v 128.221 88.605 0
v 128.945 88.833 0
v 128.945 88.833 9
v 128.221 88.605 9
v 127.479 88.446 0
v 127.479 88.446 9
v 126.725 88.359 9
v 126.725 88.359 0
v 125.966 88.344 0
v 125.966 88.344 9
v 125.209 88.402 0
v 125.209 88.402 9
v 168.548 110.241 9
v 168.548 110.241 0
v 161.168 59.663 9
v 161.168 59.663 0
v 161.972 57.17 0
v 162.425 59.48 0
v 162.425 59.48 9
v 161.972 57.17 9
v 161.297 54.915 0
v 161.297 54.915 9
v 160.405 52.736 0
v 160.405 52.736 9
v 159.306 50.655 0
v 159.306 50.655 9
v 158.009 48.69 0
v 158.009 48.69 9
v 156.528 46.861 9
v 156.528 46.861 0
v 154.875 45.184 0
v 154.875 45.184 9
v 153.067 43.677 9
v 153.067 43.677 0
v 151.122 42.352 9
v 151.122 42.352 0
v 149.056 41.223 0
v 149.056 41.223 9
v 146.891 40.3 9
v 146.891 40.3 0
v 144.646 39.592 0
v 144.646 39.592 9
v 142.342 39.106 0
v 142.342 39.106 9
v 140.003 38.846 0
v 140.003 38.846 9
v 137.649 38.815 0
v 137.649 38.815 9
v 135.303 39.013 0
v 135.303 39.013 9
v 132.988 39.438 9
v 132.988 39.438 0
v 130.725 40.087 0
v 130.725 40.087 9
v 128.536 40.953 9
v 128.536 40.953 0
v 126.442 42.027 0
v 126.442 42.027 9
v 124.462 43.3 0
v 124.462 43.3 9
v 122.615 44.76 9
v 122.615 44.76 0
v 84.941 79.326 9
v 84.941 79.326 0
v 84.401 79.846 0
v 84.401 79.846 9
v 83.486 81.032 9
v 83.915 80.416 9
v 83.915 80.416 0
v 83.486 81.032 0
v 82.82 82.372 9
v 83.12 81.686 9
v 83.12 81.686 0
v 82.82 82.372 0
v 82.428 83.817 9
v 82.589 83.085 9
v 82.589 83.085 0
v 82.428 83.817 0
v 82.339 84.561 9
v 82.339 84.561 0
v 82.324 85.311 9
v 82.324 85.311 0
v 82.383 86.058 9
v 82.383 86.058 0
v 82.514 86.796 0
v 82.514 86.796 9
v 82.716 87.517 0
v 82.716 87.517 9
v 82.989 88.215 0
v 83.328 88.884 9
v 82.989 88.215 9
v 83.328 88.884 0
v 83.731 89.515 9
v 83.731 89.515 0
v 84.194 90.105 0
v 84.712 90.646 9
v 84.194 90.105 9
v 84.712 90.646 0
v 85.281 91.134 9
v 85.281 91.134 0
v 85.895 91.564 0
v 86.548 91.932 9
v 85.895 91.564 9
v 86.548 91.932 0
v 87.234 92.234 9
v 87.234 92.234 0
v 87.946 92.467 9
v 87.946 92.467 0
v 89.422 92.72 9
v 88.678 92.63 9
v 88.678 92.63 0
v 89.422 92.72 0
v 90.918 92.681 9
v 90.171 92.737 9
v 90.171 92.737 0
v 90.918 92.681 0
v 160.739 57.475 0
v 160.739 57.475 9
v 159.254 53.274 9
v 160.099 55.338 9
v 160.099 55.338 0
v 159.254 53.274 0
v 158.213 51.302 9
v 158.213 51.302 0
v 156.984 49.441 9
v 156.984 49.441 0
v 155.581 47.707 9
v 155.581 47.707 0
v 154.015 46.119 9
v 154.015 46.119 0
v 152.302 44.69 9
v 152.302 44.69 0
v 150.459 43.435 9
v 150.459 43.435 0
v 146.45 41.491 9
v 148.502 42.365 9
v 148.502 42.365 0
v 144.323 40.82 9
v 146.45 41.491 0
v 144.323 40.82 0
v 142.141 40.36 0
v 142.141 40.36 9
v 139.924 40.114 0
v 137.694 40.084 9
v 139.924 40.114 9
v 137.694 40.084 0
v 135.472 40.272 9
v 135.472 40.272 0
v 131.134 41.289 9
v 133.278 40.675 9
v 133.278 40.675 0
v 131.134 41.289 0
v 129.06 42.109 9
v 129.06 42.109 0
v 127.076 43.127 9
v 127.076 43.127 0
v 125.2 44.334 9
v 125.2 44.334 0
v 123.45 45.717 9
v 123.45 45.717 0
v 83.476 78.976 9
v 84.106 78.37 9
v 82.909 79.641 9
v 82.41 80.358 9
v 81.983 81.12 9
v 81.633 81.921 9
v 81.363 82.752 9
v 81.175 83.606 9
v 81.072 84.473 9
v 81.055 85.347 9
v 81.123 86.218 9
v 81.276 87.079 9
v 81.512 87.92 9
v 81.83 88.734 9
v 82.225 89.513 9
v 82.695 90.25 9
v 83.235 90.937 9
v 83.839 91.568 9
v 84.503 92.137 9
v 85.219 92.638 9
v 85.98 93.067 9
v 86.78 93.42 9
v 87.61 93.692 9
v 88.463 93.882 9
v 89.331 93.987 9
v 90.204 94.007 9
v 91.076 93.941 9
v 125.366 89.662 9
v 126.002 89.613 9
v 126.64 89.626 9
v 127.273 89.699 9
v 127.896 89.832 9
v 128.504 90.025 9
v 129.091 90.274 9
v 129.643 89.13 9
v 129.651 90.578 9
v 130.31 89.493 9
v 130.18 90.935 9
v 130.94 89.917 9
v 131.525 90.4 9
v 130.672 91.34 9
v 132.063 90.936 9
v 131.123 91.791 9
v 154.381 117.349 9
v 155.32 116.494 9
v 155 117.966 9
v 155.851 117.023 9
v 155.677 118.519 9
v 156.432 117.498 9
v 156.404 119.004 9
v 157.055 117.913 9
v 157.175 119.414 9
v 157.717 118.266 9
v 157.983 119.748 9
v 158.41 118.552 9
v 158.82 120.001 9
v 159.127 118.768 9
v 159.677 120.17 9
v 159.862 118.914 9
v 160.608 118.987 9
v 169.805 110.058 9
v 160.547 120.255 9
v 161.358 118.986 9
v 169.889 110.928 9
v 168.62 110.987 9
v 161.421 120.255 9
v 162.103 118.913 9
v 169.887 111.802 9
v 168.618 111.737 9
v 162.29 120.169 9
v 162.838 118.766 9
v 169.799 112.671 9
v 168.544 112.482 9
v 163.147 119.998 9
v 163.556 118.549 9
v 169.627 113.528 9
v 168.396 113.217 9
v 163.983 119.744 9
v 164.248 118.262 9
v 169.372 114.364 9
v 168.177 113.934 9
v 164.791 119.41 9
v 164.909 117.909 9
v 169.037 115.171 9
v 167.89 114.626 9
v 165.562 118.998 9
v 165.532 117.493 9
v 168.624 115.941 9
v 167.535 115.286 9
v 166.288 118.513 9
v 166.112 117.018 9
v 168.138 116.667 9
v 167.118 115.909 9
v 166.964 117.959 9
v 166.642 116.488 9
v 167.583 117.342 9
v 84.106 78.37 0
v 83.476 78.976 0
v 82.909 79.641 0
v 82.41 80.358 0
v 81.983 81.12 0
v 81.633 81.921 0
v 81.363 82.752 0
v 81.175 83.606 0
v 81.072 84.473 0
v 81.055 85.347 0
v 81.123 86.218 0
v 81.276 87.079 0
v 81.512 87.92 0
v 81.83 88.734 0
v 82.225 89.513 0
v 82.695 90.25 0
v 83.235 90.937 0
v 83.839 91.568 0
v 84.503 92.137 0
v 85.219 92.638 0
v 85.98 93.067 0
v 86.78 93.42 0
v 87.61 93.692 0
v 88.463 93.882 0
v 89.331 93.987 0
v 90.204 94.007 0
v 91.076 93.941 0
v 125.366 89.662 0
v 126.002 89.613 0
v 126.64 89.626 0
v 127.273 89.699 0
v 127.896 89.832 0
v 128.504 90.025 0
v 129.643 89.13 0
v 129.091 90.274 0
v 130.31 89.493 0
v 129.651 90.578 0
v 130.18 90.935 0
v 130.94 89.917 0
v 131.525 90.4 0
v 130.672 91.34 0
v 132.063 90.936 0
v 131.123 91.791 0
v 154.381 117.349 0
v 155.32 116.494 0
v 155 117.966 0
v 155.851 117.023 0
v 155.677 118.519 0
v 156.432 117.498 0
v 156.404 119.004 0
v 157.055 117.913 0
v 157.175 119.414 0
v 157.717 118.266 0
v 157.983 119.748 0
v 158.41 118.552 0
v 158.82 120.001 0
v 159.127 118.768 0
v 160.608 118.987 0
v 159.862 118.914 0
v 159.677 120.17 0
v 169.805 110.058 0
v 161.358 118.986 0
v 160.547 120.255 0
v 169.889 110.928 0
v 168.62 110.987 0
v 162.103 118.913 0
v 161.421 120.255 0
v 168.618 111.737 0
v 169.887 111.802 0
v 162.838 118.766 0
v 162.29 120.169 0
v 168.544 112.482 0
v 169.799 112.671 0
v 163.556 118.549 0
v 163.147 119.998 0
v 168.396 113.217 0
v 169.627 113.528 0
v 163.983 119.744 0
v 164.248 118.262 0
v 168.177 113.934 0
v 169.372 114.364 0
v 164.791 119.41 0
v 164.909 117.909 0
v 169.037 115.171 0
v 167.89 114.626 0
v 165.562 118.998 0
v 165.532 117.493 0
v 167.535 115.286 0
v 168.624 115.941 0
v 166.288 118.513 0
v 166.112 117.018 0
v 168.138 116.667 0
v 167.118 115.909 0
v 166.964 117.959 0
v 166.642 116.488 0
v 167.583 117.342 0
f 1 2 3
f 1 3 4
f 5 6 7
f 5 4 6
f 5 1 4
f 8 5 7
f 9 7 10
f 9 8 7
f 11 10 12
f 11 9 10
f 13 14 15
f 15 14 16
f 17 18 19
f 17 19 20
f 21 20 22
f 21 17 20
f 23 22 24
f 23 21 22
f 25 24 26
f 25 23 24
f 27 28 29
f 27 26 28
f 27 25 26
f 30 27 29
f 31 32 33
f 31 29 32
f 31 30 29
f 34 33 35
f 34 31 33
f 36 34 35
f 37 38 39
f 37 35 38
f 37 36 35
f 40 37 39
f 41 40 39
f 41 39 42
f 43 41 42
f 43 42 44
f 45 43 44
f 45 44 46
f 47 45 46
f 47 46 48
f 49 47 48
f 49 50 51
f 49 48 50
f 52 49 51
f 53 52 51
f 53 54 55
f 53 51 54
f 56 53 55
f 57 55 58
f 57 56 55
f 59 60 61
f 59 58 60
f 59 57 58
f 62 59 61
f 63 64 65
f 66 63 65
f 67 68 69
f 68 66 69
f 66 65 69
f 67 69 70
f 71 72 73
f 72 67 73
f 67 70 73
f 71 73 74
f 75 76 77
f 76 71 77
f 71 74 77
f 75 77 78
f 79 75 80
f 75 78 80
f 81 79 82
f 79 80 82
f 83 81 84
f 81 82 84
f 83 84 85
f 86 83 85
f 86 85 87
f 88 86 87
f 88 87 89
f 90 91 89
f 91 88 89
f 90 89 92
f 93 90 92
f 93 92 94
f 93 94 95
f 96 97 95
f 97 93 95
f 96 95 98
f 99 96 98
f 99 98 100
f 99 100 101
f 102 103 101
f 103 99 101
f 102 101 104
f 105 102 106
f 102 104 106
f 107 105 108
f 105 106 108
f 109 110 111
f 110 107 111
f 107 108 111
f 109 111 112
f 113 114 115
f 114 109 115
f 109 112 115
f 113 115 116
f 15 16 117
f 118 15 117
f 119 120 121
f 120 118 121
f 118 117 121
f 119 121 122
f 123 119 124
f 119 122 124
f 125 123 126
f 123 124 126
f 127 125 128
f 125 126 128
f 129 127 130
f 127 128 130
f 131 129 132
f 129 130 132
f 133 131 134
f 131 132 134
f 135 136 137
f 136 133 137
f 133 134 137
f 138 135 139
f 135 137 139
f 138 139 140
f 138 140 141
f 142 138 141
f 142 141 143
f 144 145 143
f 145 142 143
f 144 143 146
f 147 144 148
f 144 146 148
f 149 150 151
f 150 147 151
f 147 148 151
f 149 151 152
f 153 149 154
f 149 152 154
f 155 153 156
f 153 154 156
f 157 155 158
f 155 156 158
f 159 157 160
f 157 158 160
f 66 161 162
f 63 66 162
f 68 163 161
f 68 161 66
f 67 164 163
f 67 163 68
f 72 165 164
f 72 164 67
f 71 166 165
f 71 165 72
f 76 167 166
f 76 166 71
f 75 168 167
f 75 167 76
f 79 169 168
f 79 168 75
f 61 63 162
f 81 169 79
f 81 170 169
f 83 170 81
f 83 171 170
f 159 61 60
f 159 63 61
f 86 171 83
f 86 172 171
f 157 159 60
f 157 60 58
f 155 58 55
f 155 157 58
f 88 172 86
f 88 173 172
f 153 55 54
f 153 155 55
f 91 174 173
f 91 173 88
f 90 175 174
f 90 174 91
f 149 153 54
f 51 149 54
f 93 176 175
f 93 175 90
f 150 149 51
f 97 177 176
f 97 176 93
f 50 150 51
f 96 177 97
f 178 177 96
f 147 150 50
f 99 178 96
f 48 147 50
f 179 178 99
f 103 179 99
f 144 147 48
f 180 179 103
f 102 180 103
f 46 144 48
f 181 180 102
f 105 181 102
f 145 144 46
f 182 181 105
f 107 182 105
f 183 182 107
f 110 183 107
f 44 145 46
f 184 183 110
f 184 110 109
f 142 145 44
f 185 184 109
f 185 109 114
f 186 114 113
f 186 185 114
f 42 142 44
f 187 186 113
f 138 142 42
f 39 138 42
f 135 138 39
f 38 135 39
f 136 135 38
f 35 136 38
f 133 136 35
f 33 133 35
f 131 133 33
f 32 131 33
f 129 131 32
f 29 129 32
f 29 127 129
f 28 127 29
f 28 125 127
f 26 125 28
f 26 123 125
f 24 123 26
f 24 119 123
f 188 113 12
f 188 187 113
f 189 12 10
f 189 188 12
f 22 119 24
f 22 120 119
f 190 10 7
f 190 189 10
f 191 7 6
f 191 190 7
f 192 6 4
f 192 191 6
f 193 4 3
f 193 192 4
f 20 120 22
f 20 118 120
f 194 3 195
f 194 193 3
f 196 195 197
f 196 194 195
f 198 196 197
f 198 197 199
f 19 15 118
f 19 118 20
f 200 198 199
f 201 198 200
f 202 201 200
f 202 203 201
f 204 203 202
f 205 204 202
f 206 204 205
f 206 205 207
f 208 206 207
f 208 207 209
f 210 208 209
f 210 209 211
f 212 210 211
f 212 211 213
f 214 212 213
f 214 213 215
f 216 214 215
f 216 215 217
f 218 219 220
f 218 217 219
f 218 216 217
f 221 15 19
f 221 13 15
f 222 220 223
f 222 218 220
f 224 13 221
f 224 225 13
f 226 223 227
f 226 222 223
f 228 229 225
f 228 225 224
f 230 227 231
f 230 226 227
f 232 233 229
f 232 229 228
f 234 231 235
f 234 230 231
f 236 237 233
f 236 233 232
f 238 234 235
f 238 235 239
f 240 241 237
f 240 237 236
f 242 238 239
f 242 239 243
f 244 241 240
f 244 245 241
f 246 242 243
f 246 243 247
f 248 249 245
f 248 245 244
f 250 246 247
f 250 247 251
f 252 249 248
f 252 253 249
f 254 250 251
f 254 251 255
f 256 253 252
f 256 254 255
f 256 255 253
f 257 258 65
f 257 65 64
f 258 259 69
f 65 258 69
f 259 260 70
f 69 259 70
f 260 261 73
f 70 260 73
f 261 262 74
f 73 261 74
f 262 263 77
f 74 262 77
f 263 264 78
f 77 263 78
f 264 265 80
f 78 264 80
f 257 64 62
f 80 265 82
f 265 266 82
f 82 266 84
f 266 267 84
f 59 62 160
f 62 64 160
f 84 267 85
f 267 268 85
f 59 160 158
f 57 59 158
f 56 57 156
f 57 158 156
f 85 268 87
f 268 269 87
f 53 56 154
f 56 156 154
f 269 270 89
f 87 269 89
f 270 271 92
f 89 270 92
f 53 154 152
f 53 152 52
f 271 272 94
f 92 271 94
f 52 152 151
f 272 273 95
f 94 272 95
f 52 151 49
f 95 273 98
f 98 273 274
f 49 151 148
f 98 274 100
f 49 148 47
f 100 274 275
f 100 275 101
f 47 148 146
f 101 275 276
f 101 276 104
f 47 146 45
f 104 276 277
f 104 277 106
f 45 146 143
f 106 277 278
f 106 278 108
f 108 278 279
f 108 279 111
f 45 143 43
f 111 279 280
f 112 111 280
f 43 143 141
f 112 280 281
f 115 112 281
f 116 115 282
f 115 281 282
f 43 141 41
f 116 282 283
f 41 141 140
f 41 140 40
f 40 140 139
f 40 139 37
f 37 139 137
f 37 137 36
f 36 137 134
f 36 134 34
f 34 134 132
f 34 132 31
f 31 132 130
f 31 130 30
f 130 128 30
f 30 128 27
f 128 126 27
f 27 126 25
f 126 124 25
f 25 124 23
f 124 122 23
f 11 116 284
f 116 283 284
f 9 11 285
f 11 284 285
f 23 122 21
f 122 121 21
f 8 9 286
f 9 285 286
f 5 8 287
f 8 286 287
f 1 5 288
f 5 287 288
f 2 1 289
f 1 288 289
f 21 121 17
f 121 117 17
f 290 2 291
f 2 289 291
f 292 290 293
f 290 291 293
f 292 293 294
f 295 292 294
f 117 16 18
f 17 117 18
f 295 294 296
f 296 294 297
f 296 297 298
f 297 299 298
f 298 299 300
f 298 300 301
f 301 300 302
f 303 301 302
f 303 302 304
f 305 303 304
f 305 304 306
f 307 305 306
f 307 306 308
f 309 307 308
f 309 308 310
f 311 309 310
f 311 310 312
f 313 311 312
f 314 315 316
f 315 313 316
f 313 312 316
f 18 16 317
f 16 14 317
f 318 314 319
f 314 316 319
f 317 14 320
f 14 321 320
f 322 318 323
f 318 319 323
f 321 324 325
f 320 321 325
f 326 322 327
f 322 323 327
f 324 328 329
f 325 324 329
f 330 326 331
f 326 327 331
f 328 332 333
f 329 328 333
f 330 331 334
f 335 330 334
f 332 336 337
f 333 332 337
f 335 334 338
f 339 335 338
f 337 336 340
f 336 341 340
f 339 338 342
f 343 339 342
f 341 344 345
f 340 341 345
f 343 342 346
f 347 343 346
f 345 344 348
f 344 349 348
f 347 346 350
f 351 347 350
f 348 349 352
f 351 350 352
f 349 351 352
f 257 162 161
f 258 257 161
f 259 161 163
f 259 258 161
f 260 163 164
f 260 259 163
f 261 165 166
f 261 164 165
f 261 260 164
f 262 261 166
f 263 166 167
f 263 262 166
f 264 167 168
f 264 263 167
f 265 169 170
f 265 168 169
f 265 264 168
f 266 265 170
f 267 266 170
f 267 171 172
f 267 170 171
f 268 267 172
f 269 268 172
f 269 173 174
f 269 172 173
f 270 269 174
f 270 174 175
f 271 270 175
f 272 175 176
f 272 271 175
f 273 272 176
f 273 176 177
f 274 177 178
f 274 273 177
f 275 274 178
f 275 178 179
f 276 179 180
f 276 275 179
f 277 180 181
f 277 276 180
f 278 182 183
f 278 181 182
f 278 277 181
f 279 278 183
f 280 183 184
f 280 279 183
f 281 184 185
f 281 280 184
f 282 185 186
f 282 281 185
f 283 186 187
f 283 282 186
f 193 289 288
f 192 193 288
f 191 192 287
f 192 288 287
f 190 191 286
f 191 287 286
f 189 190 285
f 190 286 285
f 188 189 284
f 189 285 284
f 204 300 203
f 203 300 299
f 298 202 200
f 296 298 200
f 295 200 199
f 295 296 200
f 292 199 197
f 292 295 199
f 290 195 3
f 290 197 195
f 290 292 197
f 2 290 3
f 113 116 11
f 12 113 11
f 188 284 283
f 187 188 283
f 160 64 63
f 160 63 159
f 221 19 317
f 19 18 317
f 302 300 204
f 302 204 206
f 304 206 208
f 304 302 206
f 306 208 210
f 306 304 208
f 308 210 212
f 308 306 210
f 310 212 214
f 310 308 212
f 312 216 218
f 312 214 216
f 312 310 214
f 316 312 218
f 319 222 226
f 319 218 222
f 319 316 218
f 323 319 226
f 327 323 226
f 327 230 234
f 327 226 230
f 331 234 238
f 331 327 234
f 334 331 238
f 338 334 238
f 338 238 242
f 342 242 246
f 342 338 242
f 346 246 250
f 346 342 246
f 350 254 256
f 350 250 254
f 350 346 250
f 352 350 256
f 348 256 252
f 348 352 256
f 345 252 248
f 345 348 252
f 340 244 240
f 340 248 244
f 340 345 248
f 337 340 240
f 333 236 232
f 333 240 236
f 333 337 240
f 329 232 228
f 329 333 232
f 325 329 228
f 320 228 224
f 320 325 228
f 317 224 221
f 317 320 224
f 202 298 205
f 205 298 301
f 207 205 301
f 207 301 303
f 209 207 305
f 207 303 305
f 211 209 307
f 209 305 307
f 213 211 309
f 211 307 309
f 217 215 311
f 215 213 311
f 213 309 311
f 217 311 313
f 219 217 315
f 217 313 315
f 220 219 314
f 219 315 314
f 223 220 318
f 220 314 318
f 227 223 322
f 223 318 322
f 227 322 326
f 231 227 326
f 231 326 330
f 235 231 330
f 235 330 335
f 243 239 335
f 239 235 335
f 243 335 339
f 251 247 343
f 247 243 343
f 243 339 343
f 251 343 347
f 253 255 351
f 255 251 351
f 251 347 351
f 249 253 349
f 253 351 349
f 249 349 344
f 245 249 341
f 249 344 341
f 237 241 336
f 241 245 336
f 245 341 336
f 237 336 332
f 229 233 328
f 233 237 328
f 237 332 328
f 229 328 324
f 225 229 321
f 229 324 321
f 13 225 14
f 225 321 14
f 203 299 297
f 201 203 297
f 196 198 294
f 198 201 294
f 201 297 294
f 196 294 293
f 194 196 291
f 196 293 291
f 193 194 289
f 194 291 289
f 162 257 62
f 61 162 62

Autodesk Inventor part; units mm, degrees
ref_plane "YZ Plane" through (0, 0, 0) normal (1, 0, 0) x (0, 1, 0)
ref_plane "XZ Plane" through (0, 0, 0) normal (0, 1, 0) x (-1, 0, 0)
ref_plane "XY Plane" through (0, 0, 0) normal (0, 0, 1) x (1, 0, 0)
sketch "Sketch1" plane through (0, 0, 0) normal (0, 0, 1) x (1, 0, 0)
  line L0 (84.9408, 79.3264) -> (123.4503, 45.7166)
  line L1 (168.5483, 110.2412) -> (161.1682, 59.6633)
  line L2 (90.9184, 92.6811) -> (125.2091, 88.4019)
  line L3 (132.0626, 90.936) -> (155.3205, 116.4945)
  arc A0 (90.9184, 92.6811) -> (84.9408, 79.3264) centre (89.9711, 85.09) ccw
  arc A1 (128.9448, 88.8334) -> (132.0626, 90.936) centre (126.192, 96.2783) ccw
  arc A2 (125.2091, 88.4019) -> (128.9448, 88.8334) centre (126.192, 96.2783) ccw
  arc A3 (123.4503, 45.7166) -> (161.1682, 59.6633) centre (138.5082, 62.9697) ccw
  arc A4 (168.5483, 110.2412) -> (155.3205, 116.4945) centre (160.9785, 111.3458) ccw
  line L4 (84.1057, 78.3696) -> (122.6152, 44.7598)
  arc A5 (122.6152, 44.7598) -> (162.4249, 59.4799) centre (138.5082, 62.9697) ccw
  line L5 (162.4249, 59.4799) -> (169.805, 110.0578)
  arc A6 (169.805, 110.0578) -> (154.3812, 117.3492) centre (160.9785, 111.3458) ccw
  line L6 (154.3812, 117.3492) -> (131.1233, 91.7908)
  arc A7 (128.5043, 90.0246) -> (131.1233, 91.7908) centre (126.192, 96.2783) ccw
  arc A8 (125.3663, 89.6621) -> (128.5043, 90.0246) centre (126.192, 96.2783) ccw
  line L7 (125.3663, 89.6621) -> (91.0757, 93.9413)
  arc A9 (91.0757, 93.9413) -> (84.1057, 78.3696) centre (89.9711, 85.09) ccw
  point P0 (0, 0)
  dimension "d1" = 1.27
extrude "Extrusion1" add sketch "Sketch1" along normal blind 9
ref_plane "Work Plane1" through (0, 0, 4.5) normal (0, 0, 1) x (1, 0, 0)
properties part number "290 mm Belt"
